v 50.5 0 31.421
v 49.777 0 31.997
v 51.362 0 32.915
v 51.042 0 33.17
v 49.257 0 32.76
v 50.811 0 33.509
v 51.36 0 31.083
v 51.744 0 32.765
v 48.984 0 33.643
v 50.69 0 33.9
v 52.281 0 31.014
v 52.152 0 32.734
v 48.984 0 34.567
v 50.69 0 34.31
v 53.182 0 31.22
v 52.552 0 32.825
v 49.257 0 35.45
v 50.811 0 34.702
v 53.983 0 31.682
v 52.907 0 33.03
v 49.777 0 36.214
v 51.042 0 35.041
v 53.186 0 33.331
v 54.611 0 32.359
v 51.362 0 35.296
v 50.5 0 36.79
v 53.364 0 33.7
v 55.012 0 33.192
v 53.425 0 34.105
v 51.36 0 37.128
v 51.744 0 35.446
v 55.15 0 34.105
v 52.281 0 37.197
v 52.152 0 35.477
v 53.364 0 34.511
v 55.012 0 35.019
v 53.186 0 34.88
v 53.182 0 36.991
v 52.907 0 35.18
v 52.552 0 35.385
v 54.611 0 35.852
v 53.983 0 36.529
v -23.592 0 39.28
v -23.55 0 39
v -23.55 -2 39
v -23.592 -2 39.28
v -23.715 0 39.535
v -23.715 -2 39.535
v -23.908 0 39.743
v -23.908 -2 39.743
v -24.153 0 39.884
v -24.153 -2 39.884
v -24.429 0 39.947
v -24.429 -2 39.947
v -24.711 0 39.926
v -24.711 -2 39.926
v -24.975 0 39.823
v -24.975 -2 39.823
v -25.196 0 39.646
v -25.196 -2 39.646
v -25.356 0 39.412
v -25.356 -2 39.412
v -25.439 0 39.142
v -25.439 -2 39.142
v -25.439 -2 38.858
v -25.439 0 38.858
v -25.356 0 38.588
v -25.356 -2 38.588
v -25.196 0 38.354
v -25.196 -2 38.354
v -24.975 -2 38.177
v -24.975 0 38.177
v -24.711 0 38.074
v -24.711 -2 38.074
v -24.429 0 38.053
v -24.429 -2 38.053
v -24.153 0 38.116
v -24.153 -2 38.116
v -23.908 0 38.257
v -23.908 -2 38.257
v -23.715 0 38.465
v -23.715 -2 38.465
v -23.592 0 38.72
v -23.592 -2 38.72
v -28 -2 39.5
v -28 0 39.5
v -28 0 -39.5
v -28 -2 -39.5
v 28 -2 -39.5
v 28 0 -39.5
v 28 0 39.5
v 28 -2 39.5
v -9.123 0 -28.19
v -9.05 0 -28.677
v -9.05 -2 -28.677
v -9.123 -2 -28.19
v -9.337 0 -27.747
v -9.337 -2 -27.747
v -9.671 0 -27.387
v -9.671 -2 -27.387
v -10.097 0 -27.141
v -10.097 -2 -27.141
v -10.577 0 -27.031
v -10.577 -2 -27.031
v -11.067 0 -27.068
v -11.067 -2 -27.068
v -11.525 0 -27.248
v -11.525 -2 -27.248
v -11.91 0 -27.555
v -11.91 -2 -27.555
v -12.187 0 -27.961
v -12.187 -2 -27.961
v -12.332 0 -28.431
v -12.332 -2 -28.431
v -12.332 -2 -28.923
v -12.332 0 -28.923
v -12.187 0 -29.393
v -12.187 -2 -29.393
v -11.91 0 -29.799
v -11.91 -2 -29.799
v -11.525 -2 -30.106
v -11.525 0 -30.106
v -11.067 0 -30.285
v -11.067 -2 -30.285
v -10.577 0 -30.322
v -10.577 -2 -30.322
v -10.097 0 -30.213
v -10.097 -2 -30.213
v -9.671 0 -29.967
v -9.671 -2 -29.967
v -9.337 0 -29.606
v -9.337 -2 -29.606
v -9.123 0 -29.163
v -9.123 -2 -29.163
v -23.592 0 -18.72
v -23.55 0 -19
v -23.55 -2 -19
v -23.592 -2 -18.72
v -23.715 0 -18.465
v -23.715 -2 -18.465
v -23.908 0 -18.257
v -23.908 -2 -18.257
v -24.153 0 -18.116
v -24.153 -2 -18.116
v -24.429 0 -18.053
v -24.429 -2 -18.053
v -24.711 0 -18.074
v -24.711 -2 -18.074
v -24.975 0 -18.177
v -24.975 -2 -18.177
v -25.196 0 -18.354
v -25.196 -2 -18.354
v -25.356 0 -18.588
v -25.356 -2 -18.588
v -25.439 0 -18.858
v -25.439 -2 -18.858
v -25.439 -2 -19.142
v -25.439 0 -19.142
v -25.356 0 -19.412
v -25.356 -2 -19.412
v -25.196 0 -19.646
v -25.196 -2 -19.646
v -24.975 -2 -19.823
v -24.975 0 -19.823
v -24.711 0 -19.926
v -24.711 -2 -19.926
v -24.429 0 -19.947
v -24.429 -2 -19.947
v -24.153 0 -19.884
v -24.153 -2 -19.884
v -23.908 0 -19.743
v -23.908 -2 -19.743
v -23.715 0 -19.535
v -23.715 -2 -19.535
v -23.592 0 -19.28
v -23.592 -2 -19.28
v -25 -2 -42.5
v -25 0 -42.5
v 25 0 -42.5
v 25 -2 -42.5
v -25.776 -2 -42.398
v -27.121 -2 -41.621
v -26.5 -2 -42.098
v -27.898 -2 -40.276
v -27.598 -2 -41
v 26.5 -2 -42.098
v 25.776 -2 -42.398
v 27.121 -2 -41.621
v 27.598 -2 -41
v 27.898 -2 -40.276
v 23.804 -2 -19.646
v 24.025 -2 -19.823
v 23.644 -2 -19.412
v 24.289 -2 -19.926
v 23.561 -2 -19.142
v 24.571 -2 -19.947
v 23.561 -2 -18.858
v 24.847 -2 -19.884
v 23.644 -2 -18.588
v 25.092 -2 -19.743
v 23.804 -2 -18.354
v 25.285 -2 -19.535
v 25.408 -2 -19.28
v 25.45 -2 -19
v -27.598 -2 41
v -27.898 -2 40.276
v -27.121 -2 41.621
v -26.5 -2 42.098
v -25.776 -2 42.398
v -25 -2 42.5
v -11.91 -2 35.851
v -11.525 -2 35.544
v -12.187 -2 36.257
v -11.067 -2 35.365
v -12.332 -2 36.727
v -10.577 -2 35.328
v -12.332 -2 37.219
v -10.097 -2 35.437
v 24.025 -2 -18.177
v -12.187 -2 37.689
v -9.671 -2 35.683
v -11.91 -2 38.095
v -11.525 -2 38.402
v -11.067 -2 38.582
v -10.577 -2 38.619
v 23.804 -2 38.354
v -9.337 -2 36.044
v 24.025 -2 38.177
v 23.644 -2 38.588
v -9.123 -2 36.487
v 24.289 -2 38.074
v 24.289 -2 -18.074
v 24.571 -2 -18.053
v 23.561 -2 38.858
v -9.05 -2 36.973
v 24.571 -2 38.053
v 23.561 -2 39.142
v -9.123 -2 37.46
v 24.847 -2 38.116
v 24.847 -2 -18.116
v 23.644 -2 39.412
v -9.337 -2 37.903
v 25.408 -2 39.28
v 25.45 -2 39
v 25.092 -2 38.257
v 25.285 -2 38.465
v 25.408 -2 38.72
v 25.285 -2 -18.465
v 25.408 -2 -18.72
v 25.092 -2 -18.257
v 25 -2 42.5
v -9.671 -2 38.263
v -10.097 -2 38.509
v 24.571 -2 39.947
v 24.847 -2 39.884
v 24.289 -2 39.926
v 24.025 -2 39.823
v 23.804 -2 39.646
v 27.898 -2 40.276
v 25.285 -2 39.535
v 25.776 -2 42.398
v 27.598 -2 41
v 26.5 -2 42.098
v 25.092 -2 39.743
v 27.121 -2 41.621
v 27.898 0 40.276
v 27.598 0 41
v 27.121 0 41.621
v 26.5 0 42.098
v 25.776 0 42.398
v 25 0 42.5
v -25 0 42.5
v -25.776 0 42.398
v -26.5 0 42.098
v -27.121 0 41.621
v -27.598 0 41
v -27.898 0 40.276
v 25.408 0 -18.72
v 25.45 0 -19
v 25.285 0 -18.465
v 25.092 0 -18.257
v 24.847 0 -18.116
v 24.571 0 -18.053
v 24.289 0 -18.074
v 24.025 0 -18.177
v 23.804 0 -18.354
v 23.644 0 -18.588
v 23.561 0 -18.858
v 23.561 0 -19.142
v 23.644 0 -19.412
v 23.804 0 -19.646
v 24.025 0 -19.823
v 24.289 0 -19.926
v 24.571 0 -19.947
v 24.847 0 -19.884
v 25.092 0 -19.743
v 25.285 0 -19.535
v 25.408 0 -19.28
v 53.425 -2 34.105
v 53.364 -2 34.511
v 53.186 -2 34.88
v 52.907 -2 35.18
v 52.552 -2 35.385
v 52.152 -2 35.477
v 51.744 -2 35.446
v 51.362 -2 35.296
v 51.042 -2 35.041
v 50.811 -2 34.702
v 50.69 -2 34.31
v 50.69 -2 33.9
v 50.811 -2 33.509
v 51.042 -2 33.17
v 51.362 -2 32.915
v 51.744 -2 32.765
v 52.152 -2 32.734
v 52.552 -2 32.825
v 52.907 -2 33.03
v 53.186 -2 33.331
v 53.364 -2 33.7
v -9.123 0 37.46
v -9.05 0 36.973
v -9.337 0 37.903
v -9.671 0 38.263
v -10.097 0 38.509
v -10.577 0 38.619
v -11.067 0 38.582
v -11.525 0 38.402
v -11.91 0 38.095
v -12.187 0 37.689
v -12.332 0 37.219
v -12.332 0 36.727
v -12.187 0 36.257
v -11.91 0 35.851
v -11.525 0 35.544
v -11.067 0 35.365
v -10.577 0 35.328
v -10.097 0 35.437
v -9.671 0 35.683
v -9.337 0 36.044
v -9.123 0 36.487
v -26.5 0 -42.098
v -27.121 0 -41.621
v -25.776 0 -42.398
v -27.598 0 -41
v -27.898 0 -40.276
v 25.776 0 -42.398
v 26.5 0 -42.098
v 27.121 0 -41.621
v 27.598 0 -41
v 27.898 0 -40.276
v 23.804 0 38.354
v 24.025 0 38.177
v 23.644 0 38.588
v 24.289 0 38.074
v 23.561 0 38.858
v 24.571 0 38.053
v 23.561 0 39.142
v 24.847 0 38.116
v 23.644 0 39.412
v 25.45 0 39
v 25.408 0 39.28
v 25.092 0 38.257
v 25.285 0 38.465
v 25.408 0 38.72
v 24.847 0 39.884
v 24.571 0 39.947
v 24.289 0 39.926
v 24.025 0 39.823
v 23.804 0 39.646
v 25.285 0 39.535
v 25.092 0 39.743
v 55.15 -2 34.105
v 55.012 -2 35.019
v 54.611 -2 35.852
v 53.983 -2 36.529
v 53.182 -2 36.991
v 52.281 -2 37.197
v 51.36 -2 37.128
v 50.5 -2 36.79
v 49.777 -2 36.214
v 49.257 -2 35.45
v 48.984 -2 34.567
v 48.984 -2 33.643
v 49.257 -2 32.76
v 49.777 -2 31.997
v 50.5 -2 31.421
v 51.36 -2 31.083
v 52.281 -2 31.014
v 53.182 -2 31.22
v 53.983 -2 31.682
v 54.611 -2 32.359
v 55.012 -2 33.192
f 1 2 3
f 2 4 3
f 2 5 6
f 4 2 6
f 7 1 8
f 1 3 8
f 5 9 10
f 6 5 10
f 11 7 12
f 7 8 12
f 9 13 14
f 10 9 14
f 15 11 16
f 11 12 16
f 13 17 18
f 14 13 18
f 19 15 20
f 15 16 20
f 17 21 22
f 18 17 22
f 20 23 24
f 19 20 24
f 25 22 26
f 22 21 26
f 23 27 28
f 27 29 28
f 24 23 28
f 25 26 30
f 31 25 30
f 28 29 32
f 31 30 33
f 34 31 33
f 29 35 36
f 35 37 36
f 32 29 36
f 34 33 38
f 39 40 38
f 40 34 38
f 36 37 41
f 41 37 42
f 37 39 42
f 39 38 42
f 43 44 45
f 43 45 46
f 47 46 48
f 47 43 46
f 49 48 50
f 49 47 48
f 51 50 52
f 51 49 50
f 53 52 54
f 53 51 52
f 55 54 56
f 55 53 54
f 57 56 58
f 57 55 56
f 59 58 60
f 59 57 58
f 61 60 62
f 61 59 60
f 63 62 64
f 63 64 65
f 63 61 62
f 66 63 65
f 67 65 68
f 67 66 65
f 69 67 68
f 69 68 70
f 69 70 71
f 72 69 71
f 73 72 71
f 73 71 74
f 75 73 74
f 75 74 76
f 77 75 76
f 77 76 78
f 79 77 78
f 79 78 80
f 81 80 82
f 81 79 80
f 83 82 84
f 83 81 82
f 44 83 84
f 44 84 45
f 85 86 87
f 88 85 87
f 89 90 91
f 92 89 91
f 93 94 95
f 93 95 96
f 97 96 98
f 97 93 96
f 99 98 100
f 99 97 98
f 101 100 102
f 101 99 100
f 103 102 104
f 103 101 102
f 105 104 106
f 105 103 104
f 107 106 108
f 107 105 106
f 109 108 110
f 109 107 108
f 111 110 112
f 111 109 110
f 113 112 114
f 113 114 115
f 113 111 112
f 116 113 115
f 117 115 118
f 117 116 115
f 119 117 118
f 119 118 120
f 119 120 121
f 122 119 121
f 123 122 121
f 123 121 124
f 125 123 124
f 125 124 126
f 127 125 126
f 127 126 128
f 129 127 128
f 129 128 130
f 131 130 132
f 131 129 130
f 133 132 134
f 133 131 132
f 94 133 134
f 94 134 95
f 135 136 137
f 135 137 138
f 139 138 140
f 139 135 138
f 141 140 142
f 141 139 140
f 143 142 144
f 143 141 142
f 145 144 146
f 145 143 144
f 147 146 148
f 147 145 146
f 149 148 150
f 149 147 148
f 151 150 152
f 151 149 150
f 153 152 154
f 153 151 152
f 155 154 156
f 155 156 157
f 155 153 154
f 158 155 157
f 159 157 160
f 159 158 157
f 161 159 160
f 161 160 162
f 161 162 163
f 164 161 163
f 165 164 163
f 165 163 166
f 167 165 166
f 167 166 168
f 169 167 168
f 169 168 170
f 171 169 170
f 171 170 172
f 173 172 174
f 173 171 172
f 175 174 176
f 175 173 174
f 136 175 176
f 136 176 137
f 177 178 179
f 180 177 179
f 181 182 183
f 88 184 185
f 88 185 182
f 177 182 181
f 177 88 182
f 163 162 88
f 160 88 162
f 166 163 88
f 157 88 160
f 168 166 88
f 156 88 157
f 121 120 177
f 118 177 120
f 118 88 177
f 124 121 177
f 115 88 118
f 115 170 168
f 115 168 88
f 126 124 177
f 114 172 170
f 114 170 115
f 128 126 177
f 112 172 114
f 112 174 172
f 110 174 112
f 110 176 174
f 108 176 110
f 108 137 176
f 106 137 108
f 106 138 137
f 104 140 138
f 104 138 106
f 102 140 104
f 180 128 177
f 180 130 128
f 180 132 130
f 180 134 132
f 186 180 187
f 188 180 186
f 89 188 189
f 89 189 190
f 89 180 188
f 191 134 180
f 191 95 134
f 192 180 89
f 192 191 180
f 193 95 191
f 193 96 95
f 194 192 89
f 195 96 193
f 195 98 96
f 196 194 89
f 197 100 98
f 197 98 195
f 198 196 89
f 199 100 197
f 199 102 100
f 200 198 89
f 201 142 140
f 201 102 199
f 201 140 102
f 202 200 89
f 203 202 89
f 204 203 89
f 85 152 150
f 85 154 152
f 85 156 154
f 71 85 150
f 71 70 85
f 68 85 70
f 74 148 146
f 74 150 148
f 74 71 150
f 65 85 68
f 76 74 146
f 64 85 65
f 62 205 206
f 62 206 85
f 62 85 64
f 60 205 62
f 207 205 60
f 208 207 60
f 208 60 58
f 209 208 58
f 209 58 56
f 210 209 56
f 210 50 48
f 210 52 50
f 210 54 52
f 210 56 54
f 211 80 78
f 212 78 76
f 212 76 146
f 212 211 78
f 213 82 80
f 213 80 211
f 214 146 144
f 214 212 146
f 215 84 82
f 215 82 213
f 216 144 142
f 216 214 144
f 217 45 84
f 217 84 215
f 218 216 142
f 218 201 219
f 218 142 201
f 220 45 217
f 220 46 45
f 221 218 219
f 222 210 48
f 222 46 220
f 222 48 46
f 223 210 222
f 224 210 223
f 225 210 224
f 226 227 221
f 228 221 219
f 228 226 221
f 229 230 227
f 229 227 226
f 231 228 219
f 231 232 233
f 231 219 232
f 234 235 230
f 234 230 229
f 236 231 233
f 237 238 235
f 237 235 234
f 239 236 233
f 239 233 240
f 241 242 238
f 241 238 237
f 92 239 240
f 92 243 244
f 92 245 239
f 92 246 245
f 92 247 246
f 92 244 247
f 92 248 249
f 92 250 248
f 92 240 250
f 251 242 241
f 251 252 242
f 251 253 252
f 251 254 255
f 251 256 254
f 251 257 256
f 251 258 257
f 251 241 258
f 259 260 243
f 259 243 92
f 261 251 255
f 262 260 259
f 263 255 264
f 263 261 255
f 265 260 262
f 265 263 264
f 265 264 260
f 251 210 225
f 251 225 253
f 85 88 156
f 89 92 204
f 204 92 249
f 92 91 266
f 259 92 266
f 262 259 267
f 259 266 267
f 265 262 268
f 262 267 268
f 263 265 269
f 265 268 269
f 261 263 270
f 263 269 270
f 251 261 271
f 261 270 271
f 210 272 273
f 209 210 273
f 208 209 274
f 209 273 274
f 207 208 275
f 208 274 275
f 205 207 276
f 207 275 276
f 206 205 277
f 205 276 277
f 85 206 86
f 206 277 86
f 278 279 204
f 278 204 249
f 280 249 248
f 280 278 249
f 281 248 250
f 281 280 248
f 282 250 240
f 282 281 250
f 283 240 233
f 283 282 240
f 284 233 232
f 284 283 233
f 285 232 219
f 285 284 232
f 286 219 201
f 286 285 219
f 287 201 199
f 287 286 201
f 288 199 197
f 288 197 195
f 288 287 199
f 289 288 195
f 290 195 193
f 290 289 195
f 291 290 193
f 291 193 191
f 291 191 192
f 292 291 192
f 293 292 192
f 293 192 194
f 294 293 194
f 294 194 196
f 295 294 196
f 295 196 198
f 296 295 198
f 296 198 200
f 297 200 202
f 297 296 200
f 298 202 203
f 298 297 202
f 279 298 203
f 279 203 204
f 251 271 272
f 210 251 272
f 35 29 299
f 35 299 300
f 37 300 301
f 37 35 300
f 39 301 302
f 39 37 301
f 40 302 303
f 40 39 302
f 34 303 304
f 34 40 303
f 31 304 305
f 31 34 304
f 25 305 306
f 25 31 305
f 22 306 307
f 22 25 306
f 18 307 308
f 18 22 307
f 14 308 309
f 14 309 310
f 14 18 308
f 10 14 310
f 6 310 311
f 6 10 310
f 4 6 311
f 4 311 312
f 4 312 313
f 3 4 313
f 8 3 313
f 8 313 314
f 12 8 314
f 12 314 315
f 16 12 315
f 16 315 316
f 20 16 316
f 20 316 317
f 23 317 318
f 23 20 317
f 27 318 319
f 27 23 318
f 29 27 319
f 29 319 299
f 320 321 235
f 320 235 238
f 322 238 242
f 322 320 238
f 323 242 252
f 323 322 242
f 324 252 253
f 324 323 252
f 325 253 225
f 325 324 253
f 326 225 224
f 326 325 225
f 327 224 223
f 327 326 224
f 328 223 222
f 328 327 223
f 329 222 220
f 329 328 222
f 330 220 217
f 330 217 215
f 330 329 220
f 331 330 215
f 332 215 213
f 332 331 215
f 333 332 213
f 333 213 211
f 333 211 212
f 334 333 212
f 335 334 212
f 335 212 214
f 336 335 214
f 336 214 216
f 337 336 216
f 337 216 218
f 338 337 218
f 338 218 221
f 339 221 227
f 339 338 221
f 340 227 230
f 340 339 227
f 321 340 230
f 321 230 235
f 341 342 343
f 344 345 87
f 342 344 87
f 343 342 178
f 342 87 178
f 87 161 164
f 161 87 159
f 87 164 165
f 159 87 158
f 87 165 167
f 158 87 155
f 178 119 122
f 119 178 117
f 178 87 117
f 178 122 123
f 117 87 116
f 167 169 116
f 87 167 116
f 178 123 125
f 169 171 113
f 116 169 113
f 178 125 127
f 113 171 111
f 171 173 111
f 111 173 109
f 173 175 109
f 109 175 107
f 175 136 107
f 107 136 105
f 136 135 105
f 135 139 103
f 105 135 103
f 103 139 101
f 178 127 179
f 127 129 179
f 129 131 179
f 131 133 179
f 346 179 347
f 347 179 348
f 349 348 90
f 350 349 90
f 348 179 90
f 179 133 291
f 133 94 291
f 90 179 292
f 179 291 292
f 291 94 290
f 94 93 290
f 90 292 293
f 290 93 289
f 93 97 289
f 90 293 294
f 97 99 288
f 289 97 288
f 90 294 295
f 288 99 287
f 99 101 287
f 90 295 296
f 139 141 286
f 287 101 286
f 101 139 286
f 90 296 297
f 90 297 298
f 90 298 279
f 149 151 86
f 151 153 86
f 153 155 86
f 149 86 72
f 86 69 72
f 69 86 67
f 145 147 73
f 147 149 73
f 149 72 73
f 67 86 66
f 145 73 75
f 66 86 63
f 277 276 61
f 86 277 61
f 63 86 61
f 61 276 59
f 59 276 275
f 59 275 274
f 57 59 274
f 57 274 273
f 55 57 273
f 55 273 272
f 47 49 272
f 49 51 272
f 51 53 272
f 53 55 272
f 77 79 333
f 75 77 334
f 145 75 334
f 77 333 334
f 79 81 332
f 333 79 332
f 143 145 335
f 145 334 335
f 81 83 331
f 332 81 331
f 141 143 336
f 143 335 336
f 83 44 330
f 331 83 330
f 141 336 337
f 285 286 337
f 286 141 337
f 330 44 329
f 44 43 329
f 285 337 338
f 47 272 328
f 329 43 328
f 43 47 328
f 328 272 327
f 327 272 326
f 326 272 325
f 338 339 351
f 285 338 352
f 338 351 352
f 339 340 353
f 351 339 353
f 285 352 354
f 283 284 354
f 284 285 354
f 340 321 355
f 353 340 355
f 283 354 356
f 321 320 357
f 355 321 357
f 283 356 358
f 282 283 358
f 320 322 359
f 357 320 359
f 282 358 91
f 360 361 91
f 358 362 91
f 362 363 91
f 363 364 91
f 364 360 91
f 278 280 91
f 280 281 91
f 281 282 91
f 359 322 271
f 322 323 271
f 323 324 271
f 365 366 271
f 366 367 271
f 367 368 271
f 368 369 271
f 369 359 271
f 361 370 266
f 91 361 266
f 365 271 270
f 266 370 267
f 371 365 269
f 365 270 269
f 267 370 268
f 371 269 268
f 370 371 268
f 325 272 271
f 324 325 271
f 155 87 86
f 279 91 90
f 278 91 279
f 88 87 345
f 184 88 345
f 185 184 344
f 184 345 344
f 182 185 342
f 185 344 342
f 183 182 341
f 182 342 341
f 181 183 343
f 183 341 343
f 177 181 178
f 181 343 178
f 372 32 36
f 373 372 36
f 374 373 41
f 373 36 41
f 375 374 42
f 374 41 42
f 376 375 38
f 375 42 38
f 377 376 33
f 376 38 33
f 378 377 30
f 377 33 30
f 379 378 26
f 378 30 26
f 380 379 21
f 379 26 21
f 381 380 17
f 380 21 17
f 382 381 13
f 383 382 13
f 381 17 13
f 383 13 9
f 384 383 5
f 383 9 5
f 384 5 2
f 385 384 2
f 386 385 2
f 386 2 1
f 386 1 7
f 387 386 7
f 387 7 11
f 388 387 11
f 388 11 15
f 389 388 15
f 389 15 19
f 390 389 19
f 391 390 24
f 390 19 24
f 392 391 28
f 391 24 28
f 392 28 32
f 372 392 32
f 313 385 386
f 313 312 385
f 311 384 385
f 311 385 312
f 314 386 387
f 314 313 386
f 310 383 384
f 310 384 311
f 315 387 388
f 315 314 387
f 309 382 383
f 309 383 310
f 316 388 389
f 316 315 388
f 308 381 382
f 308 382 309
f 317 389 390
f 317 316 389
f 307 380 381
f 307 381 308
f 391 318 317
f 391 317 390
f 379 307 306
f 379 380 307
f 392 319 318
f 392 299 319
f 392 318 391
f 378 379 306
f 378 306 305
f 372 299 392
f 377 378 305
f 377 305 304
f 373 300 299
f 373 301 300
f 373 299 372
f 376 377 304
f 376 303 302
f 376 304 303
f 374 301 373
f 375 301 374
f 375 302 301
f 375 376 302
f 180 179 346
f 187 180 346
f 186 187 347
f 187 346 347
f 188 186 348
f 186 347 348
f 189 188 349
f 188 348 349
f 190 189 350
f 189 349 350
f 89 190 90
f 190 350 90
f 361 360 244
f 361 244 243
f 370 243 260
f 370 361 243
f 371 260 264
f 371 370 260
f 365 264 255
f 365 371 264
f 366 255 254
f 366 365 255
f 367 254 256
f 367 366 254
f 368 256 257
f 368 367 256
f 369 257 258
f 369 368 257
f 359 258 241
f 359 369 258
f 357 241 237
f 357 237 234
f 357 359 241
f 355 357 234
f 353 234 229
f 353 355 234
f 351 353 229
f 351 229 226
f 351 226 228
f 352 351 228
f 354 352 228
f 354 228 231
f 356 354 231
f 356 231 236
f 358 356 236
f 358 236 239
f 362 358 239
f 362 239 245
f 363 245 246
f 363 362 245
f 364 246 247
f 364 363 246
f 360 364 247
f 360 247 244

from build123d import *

# Parameters (mm, degrees)
F0_R     = 1.65
F0_R_2   = 0.95
F0_R_3   = 3.1
F0_R_4   = 1.375
F1_DEPTH = 2


with BuildPart() as f1:
    # F0 (on Front) → F1 (new body)
    with BuildSketch(Plane.XZ):
        with BuildLine():
            Line((25, 42.5), (-25, 42.5))
            ThreePointArc((-25, 42.5), (-27.12132, 41.62132), (-28, 39.5))
            Line((-28, 39.5), (-28, -39.5))
            ThreePointArc((-28, -39.5), (-27.12132, -41.62132), (-25, -42.5))
            Line((-25, -42.5), (25, -42.5))
            ThreePointArc((25, -42.5), (27.12132, -41.62132), (28, -39.5))
            Line((28, -39.5), (28, 39.5))
            ThreePointArc((28, 39.5), (27.12132, 41.62132), (25, 42.5))
        make_face()
        with Locations((-10.7, -28.676836)):
            Circle(F0_R, mode=Mode.SUBTRACT)
        with Locations((-24.5, -19)):
            Circle(F0_R_2, mode=Mode.SUBTRACT)
        with Locations((24.5, -19)):
            Circle(F0_R_2, mode=Mode.SUBTRACT)
        with Locations((-24.5, 39)):
            Circle(F0_R_2, mode=Mode.SUBTRACT)
        with Locations((-10.7, 36.973164)):
            Circle(F0_R, mode=Mode.SUBTRACT)
        with Locations((24.5, 39)):
            Circle(F0_R_2, mode=Mode.SUBTRACT)
        with Locations((52.049726, 34.105394)):
            Circle(F0_R_3)
        with Locations((52.049726, 34.105394)):
            Circle(F0_R_4, mode=Mode.SUBTRACT)
    extrude(amount=F1_DEPTH)


solid = f1.part
